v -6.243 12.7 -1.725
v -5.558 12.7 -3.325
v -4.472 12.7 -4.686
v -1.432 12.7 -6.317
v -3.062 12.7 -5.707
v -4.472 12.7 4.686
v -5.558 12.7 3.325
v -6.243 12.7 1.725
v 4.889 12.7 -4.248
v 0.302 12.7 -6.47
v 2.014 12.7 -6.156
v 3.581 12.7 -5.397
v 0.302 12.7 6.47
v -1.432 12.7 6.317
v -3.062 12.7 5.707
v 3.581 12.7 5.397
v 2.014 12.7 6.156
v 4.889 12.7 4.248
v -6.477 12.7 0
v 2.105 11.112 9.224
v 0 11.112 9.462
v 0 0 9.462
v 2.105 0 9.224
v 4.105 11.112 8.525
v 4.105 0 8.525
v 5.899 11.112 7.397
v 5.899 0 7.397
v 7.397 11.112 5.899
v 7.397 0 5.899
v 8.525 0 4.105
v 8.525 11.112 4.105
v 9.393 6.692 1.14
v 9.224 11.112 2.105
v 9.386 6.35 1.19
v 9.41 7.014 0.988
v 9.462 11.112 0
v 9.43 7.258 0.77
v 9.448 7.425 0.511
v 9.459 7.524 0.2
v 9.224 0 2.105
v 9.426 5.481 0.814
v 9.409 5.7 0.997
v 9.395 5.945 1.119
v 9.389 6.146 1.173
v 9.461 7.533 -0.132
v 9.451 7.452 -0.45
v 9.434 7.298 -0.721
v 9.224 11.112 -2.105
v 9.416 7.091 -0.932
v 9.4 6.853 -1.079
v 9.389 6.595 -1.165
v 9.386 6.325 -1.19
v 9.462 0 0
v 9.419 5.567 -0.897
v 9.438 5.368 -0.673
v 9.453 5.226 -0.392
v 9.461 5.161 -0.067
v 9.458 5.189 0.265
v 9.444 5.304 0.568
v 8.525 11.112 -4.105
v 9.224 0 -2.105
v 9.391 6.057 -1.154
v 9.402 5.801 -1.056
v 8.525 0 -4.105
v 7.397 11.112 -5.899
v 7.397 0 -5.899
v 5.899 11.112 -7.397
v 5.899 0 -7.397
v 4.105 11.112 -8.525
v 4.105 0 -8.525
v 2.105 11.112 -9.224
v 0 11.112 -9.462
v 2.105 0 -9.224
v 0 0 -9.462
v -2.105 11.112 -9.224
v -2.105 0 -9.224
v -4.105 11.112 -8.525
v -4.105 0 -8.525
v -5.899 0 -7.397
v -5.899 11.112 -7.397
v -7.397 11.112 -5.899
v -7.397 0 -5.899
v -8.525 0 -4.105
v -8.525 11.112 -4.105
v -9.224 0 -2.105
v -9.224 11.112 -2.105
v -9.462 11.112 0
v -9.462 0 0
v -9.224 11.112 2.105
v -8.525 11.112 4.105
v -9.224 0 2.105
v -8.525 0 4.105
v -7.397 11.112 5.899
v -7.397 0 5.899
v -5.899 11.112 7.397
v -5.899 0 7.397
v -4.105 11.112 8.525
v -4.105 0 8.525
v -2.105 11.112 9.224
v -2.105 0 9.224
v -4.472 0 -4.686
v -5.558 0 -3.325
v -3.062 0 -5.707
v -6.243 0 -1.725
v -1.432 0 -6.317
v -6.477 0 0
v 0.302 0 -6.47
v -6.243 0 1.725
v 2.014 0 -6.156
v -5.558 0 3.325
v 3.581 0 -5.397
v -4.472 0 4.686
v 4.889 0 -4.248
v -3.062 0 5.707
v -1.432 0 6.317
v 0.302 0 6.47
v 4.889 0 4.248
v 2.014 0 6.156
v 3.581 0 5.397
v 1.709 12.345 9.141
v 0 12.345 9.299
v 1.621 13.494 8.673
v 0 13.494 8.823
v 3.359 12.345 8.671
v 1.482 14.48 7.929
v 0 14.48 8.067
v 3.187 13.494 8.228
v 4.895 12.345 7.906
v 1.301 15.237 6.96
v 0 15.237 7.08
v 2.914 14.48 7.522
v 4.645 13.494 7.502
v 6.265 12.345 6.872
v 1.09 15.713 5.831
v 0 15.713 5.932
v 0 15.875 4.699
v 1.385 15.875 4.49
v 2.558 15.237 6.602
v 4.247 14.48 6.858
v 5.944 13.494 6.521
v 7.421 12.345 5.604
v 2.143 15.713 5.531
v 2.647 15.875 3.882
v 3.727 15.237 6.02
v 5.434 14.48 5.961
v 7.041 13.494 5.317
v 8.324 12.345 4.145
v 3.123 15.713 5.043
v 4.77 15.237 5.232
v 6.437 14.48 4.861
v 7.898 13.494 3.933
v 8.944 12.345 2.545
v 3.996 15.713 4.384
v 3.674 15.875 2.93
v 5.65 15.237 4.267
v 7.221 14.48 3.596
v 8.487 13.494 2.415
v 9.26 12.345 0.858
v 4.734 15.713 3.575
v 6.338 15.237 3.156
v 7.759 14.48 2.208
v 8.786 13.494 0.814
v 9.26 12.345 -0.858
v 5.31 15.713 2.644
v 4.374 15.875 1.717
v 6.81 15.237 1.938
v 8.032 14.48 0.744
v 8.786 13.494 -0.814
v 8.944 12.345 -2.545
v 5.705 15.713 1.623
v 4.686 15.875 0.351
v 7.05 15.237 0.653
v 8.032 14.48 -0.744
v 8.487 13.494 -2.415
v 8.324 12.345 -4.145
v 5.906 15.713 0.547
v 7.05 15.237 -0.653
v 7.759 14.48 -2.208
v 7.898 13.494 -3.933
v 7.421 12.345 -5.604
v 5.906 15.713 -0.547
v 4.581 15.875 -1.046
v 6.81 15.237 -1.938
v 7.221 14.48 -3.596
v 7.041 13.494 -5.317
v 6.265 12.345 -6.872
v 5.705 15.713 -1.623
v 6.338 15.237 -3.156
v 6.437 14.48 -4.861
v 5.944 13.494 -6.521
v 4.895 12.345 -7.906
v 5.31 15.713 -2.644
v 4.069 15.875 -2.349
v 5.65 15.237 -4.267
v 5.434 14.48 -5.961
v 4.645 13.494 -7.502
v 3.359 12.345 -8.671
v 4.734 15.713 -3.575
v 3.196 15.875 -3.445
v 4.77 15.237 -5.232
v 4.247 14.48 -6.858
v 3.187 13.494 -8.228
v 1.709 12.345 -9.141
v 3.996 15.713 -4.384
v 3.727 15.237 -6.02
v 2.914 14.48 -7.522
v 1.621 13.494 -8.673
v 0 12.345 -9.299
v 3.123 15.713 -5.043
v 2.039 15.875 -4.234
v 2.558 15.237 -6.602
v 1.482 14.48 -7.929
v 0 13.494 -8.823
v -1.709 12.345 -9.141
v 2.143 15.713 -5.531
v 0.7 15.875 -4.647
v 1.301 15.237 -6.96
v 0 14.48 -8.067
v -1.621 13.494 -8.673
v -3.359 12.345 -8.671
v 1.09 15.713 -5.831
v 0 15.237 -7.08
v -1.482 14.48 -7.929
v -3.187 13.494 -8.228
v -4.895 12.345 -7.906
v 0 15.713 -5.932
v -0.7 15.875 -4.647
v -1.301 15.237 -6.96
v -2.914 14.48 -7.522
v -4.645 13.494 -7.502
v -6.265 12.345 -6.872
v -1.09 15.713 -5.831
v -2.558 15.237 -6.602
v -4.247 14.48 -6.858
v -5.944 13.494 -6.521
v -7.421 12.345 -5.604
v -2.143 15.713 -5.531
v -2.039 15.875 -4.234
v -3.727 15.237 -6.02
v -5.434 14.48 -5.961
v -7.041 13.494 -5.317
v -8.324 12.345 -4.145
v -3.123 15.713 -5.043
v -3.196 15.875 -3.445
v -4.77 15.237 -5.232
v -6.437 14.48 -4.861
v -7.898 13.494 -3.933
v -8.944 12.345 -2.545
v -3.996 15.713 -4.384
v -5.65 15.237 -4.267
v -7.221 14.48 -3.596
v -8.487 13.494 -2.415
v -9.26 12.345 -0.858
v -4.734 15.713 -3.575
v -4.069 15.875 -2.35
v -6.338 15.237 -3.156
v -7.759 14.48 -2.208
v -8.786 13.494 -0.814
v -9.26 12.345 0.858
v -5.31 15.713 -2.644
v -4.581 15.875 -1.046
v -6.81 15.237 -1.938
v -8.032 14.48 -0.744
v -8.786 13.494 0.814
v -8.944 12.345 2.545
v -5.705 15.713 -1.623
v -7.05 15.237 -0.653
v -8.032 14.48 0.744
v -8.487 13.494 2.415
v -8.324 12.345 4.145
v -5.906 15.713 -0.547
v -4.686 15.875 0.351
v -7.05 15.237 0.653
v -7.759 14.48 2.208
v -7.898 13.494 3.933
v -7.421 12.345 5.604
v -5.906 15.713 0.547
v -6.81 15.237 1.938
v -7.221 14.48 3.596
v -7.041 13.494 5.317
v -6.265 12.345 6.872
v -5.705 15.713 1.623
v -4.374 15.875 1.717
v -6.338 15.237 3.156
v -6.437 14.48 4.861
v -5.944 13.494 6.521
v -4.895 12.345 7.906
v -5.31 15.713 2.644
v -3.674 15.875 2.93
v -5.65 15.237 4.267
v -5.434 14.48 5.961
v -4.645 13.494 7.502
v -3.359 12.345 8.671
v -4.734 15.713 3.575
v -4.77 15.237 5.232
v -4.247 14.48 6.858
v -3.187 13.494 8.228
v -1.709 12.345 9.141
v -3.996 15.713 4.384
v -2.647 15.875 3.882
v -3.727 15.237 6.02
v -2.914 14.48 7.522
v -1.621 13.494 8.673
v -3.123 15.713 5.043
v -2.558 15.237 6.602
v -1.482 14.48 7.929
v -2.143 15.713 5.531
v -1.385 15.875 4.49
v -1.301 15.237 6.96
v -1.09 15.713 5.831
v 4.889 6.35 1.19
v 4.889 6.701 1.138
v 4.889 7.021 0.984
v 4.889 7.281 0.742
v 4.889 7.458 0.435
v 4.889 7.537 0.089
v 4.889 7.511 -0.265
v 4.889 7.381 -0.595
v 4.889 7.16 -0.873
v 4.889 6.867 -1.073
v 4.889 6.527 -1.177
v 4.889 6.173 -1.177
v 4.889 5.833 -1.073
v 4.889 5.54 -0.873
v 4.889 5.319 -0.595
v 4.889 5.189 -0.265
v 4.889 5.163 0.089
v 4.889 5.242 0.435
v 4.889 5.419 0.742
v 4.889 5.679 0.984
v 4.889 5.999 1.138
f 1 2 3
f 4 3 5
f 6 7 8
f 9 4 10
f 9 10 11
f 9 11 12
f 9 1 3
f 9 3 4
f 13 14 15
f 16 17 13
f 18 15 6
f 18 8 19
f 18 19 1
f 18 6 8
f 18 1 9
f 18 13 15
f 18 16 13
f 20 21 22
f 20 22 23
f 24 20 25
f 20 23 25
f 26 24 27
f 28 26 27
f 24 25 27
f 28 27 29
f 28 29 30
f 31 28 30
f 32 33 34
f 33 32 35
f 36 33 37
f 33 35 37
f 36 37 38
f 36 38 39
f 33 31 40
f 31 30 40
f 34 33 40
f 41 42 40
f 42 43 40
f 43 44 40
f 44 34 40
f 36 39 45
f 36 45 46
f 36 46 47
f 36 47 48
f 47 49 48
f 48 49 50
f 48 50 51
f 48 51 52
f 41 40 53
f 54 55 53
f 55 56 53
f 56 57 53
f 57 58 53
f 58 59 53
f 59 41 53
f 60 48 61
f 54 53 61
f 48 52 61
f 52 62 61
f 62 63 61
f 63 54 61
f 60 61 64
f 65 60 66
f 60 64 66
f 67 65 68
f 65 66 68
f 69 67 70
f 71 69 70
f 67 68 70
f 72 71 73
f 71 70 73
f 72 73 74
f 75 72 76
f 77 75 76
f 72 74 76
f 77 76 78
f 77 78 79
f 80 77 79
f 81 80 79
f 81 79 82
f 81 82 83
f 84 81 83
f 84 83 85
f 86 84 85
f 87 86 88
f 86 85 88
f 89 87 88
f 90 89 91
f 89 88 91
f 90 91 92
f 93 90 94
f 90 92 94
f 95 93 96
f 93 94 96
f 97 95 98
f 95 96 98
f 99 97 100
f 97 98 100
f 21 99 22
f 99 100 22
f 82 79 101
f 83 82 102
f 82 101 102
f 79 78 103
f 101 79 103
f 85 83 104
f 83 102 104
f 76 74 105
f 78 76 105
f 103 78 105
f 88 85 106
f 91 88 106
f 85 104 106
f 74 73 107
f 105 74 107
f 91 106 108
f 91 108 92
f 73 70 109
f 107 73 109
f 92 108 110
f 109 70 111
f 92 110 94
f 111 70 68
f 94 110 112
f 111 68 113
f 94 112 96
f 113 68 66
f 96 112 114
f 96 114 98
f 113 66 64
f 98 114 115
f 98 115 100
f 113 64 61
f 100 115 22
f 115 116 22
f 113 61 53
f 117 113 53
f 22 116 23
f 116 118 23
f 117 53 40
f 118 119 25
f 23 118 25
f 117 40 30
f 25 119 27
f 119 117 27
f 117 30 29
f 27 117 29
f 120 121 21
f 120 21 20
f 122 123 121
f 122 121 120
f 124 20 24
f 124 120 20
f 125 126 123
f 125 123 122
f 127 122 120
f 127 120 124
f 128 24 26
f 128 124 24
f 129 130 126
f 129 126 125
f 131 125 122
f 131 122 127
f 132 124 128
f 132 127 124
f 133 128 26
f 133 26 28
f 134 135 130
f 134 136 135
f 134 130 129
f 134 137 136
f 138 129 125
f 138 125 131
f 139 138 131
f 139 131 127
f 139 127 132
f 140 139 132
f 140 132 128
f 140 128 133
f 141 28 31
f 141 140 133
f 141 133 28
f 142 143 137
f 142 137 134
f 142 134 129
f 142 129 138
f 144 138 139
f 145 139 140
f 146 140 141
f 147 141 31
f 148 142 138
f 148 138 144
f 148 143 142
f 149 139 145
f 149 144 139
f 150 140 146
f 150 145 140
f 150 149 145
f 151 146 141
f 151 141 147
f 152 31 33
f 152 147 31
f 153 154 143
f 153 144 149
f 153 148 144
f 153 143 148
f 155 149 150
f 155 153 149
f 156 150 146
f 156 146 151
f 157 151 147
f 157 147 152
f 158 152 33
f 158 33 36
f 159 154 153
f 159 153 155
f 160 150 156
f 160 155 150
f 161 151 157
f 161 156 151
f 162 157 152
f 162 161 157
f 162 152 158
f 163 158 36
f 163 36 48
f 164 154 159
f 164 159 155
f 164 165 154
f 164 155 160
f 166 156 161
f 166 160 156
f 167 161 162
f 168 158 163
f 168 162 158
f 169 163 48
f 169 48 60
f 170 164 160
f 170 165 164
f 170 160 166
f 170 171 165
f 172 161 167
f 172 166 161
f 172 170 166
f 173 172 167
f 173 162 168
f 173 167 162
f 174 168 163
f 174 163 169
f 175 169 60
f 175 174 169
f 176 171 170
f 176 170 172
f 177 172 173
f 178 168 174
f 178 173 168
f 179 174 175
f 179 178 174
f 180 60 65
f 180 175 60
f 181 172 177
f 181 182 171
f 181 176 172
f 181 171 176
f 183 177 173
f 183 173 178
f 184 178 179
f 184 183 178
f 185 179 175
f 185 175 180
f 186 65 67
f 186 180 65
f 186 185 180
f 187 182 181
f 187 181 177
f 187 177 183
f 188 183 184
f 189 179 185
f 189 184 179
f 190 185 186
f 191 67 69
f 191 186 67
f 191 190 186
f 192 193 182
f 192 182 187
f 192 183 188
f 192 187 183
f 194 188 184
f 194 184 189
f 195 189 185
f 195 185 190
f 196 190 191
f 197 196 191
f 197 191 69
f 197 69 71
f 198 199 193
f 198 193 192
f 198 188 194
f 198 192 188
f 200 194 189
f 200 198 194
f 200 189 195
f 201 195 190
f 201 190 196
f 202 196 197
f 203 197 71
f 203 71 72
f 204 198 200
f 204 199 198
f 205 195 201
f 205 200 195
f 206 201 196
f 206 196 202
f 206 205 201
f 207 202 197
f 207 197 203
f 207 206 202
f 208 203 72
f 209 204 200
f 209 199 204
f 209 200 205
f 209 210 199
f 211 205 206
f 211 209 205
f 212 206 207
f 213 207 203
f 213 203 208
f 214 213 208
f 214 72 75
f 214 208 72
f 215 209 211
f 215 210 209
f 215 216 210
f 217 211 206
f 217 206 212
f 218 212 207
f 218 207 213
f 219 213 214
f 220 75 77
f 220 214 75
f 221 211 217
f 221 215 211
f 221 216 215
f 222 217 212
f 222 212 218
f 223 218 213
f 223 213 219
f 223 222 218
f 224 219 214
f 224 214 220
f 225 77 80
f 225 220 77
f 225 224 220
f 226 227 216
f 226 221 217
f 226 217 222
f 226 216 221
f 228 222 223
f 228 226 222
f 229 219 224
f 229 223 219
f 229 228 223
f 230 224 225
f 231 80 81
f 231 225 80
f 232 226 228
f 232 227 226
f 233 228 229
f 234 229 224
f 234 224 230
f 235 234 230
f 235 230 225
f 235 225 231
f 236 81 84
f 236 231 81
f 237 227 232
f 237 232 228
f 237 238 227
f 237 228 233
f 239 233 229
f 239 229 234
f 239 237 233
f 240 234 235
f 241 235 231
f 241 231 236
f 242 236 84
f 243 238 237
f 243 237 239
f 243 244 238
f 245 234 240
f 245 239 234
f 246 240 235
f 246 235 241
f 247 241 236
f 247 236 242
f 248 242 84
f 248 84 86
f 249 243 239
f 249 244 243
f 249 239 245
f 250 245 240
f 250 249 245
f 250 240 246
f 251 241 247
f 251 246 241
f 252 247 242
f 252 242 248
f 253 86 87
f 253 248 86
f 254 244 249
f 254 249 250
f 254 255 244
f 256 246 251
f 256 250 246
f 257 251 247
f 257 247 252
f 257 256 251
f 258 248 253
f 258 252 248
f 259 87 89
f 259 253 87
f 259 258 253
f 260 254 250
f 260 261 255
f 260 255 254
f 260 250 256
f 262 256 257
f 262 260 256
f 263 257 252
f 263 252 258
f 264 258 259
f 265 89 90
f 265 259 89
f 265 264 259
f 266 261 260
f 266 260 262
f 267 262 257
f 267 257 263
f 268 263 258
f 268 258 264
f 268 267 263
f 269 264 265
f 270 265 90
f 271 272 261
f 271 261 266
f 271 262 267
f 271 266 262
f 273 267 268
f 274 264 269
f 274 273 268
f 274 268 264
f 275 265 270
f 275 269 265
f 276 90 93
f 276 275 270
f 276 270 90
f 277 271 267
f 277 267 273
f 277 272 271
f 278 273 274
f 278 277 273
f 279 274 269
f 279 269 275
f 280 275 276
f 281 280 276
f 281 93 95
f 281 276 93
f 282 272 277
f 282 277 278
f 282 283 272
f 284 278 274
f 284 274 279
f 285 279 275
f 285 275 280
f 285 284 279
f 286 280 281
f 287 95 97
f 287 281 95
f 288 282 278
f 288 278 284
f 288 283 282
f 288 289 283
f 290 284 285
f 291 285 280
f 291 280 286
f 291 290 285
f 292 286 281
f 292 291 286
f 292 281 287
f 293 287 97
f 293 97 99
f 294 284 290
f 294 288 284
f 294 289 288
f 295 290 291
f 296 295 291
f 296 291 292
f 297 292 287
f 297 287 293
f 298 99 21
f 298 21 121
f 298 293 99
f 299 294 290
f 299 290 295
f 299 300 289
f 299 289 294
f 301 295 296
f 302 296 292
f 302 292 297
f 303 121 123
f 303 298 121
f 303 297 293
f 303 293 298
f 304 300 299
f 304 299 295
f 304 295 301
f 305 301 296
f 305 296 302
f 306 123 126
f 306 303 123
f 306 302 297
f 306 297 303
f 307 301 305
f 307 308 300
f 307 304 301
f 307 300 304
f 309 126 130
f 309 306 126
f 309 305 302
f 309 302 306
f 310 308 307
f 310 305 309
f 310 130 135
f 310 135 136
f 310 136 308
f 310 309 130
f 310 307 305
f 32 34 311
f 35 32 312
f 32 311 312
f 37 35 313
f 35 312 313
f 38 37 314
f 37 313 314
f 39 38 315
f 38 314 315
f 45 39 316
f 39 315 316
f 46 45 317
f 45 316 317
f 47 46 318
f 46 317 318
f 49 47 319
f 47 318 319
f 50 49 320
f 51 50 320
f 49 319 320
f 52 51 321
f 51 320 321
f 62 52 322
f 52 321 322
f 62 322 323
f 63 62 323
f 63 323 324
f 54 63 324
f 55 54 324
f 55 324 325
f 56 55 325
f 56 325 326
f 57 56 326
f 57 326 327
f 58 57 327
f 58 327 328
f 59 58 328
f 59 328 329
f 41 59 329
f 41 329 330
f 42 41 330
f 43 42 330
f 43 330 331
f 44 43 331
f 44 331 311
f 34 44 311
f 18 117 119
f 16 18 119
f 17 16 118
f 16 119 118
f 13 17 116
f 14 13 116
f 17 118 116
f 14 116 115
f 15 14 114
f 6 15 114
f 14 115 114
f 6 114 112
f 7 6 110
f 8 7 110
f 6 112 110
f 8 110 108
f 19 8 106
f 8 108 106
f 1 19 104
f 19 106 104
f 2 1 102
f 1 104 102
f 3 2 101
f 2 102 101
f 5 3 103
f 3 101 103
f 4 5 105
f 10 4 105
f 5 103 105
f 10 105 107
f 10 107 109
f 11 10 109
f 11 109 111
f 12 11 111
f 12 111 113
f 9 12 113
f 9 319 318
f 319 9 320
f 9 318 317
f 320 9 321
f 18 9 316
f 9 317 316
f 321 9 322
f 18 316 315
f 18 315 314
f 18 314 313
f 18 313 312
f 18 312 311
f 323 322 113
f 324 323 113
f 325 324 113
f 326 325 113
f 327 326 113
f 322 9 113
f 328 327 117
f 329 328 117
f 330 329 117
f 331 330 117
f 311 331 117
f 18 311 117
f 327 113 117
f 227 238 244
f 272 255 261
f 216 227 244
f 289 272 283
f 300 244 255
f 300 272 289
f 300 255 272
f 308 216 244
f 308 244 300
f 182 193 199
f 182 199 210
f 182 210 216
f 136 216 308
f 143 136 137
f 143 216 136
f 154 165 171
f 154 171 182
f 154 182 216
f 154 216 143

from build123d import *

# Parameters (mm, degrees)
SKETCH1_R           = 6.2865
BOSS_EXTRUDE1_DEPTH = 15.875
SKETCH2_R           = 9.4615
BOSS_EXTRUDE2_DEPTH = 15.875
CUT_EXTRUDE1_DEPTH  = 12.7
FILLET1_R           = 4.7625
SKETCH4_R           = 1.1905
CUT_EXTRUDE2_DEPTH  = 24.398129359


with BuildPart() as part:
    # Sketch1 → Boss-Extrude1 (new body)
    with BuildSketch(Plane(origin=(0, 0, 0), x_dir=(1, 0, 0), z_dir=(0, 1, 0))):
        with Locations(Location((0, 0, 0), (0, 0, 270))):
            Circle(SKETCH1_R)
    extrude(amount=BOSS_EXTRUDE1_DEPTH)

    # Sketch2 → Boss-Extrude2 (add)
    with BuildSketch(Plane(origin=(0, 0, 0), x_dir=(1, 0, 0), z_dir=(0, 1, 0))):
        with Locations(Location((0, 0, 0), (0, 0, 270))):
            Circle(SKETCH2_R)
    extrude(amount=BOSS_EXTRUDE2_DEPTH)

    # Sketch3 → Cut-Extrude1 (cut)
    with BuildSketch(Plane.XZ):
        with BuildLine():
            Line((4.889, -4.248435947), (4.889, 4.248435947))
            ThreePointArc((4.889, 4.248435947), (-6.477, 0), (4.889, -4.248435947))
        make_face()
    extrude(amount=-CUT_EXTRUDE1_DEPTH, mode=Mode.SUBTRACT)

    # Fillet1
    fillet1_edges = [part.edges().sort_by_distance(p)[0] for p in [
        (0, 15.875, -9.4615),
    ]]
    fillet(fillet1_edges, radius=FILLET1_R)

    # Sketch4 → Cut-Extrude2 (cut, through all)
    with BuildSketch(Plane.ZY.offset(-4.889)):
        with Locations((0, 6.35)):
            Circle(SKETCH4_R)
    extrude(amount=-CUT_EXTRUDE2_DEPTH, mode=Mode.SUBTRACT)


solid = part.part
